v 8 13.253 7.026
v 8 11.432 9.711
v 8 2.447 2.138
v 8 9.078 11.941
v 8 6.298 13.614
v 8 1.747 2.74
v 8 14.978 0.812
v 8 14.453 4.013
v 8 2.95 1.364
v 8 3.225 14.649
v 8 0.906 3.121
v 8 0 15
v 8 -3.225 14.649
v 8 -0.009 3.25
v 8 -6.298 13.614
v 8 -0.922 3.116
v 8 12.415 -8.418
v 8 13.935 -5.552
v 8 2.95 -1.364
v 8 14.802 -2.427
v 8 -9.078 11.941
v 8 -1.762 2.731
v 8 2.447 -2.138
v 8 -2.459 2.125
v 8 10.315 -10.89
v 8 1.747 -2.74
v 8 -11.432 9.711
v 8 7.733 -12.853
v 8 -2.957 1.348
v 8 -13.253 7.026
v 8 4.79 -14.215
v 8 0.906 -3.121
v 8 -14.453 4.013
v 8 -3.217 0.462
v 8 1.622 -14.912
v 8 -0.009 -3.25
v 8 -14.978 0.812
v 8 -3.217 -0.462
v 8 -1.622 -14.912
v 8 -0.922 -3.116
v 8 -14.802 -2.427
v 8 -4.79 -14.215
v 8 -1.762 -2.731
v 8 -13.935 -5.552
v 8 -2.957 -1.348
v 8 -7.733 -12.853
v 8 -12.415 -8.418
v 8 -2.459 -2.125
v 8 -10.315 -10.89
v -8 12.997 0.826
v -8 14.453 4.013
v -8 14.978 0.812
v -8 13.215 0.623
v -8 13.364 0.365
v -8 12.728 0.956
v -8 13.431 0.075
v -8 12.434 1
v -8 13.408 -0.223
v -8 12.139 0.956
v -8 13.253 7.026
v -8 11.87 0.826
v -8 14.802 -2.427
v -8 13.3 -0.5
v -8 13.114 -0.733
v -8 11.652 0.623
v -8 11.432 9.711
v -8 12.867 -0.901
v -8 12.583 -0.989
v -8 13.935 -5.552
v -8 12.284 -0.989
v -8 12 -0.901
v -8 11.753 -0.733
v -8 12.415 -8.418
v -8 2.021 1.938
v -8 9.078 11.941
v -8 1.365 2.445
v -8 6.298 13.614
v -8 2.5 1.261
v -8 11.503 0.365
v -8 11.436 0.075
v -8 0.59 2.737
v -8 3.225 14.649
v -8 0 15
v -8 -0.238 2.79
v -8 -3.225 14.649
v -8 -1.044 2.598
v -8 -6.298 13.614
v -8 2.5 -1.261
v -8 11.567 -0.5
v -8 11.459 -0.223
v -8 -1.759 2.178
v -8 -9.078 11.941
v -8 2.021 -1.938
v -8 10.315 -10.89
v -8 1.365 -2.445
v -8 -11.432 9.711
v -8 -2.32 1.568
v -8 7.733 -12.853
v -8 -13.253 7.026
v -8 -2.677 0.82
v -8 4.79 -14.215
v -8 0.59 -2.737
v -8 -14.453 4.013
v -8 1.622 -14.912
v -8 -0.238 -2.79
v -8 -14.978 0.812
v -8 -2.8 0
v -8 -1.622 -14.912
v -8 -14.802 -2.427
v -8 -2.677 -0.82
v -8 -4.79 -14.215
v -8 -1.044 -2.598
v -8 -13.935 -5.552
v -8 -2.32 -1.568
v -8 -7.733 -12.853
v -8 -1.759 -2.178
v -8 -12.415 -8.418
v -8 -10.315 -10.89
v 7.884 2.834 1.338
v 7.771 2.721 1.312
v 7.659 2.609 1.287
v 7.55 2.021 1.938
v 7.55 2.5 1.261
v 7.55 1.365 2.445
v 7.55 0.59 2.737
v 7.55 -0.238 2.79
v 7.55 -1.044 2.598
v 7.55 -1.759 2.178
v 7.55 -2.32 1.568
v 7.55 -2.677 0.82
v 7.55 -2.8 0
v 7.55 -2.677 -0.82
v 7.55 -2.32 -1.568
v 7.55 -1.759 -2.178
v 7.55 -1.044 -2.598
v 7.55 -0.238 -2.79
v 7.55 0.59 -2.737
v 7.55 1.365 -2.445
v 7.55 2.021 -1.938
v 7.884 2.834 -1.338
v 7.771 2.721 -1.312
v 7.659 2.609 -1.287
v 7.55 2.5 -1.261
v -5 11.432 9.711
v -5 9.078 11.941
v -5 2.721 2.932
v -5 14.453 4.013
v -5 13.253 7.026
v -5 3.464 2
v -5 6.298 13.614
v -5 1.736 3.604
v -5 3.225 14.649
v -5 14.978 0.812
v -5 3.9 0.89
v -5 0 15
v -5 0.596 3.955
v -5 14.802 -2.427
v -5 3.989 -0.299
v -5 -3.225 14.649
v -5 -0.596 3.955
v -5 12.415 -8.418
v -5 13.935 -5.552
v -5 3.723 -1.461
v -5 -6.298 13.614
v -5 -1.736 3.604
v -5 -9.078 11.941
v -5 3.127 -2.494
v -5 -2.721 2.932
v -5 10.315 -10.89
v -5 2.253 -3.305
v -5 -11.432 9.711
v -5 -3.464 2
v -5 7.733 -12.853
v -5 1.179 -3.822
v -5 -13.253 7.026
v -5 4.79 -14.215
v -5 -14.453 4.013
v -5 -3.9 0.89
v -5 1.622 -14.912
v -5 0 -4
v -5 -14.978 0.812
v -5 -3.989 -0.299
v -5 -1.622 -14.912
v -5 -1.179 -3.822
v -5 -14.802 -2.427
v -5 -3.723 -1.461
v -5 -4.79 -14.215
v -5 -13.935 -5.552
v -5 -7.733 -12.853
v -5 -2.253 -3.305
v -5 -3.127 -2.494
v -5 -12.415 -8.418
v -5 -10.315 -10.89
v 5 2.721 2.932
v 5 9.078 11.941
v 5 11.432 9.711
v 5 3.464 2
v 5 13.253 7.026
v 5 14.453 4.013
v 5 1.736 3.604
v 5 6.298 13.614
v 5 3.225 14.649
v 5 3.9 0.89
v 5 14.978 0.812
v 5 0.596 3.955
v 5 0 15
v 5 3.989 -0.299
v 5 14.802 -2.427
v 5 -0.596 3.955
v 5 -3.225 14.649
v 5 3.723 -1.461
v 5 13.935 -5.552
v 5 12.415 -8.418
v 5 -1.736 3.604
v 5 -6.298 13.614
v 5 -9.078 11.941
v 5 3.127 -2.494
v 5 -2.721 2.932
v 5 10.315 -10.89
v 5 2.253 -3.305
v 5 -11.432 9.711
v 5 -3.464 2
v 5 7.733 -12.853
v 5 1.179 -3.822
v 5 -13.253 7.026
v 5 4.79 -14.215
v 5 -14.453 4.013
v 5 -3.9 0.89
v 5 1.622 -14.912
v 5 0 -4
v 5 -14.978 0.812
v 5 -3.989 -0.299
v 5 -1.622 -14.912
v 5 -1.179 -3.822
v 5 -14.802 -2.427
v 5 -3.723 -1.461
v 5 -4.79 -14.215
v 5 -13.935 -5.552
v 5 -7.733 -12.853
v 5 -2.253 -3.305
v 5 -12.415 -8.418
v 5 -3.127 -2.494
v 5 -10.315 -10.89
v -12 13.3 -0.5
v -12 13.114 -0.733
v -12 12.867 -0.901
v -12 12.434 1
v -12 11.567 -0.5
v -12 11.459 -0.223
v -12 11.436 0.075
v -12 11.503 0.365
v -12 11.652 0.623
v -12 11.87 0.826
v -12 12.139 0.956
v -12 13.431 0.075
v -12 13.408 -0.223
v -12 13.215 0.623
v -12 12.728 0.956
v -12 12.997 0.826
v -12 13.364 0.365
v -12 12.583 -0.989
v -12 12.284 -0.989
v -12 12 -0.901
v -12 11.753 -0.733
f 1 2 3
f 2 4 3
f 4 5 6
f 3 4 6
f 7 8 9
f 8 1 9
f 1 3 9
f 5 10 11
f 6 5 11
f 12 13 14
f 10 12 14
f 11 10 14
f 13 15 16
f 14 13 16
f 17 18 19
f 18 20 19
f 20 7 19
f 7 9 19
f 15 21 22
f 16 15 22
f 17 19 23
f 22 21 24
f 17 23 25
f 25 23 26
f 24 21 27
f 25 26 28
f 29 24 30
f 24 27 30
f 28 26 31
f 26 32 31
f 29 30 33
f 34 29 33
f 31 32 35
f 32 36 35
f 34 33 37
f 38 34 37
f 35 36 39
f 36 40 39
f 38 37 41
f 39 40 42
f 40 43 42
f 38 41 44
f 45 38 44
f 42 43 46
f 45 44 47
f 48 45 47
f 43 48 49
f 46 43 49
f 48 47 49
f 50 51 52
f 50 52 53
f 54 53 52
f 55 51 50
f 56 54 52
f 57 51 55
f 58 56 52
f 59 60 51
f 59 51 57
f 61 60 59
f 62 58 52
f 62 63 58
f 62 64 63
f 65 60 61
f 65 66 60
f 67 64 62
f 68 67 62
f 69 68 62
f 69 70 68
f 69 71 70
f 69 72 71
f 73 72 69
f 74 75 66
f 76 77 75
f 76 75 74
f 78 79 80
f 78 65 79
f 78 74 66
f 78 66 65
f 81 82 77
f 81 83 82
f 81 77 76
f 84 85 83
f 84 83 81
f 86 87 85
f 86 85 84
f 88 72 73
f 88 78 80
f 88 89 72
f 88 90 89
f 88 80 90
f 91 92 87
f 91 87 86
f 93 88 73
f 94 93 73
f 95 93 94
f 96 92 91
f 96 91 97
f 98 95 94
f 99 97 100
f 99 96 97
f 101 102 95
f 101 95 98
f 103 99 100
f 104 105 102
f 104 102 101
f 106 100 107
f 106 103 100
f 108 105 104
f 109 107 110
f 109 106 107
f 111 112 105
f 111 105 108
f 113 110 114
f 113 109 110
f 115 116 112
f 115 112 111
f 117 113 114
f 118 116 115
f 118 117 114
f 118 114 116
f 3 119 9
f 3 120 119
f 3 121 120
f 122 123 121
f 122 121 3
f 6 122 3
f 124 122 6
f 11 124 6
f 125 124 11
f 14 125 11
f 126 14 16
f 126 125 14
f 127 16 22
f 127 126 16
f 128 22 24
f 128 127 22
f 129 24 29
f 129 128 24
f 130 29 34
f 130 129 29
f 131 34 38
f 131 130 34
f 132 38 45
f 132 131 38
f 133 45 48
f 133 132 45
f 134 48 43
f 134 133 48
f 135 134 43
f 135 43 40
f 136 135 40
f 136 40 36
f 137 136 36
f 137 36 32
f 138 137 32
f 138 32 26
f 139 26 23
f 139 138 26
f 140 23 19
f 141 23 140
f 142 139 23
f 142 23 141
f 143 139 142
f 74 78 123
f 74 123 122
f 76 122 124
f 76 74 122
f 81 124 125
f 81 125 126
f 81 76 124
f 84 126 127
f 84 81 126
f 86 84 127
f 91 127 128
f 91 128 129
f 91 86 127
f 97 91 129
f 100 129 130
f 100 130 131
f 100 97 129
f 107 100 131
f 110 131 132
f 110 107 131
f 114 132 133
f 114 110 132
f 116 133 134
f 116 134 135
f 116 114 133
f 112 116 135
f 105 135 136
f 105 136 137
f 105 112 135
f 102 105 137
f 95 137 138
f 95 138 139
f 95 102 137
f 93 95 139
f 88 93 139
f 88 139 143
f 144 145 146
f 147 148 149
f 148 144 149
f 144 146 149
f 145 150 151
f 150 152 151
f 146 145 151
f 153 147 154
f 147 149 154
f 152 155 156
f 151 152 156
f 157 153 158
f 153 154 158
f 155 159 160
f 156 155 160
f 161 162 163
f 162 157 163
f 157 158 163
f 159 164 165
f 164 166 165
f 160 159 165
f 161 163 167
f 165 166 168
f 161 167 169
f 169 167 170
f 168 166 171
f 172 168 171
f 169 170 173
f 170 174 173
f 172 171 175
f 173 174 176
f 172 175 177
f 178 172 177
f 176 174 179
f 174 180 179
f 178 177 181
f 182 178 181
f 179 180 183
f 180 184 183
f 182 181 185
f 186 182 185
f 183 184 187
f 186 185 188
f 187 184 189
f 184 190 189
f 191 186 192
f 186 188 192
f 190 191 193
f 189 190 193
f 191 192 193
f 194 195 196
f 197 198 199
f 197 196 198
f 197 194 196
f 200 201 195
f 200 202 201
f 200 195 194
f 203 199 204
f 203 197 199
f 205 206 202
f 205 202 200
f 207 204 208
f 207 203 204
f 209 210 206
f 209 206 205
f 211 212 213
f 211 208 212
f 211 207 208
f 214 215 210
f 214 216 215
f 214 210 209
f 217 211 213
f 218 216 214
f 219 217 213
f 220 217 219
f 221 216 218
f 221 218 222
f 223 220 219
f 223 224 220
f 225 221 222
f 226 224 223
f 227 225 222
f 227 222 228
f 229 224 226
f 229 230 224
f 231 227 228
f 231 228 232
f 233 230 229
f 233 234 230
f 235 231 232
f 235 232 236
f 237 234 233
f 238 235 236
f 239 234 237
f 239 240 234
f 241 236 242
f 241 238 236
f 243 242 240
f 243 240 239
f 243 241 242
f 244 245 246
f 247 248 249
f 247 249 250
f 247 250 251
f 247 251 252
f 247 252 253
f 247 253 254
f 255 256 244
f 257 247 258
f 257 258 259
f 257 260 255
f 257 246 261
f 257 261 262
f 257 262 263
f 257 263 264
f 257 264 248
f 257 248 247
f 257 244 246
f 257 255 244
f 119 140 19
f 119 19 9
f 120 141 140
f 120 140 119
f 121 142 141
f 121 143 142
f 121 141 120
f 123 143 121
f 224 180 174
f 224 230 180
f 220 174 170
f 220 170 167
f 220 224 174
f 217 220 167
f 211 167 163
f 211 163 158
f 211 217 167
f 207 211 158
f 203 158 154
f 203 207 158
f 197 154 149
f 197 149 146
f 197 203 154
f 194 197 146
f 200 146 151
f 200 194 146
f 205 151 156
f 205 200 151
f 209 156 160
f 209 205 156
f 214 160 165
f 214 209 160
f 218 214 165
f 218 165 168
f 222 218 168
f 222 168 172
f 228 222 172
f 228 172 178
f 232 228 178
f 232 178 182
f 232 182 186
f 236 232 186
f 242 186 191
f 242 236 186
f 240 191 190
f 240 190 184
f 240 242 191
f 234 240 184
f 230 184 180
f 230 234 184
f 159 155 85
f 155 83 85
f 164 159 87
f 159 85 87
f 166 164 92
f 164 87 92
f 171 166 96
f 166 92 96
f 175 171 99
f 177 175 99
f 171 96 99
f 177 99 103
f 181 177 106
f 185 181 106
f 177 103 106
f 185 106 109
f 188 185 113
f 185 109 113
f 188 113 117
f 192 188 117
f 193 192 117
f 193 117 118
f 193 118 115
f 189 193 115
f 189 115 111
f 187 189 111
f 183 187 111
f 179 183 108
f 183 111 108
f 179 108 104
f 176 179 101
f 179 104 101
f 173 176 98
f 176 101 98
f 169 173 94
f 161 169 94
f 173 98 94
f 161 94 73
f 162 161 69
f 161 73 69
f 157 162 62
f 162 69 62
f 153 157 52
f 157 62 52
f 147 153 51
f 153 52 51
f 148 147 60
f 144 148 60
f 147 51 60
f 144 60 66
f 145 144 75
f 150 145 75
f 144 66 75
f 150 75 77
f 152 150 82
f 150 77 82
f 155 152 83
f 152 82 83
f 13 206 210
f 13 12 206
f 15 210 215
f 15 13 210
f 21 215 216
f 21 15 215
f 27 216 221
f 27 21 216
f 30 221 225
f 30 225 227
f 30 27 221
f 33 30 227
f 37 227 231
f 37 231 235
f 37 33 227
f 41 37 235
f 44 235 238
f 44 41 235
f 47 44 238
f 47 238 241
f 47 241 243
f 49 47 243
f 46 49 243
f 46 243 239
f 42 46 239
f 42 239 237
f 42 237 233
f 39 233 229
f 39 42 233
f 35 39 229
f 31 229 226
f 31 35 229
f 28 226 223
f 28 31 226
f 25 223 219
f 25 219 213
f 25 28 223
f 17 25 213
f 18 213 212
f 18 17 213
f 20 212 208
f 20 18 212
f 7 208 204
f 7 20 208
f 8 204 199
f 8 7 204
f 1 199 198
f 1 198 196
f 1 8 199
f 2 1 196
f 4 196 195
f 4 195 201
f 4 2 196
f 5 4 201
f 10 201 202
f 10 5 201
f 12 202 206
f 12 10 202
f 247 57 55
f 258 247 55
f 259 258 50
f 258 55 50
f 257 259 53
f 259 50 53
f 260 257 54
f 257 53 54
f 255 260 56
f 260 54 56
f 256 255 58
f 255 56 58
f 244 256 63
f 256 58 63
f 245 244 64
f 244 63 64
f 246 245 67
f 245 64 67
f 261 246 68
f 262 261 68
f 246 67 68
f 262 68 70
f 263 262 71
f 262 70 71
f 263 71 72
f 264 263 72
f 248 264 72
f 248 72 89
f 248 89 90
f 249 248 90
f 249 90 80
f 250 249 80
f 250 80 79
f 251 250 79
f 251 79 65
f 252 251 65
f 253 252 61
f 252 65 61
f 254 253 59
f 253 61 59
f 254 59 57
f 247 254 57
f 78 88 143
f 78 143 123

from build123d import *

# Parameters (mm, degrees)
SKETCH1_R               = 4
FEMALE_SHAFT_DEPTH      = 5
SKETCH6_W               = 3
SKETCH6_H               = 15
MALE_START              = -8
MALE_SHAFT_INSERT_DEPTH = 16
CHAMFER1_SIZE           = 0.45
SKETCH7_R               = 1
BOSS_EXTRUDE1_DEPTH     = 4


# Read off the part's stored shape, not the designer's step: Male Shaft Insert
with BuildPart() as part:
    # Sketch1 → Female Shaft (new, symmetric)
    with BuildSketch(Plane(origin=(0, 0, 0), x_dir=(0, 0, -1), z_dir=(1, 0, 0))):
        Circle(SKETCH1_R)
        with BuildLine():
            Line((-1.260952021, 2.5), (1.260952021, 2.5))
            ThreePointArc((1.260952021, 2.5), (0, -2.8), (-1.260952021, 2.5))
        make_face(mode=Mode.SUBTRACT)
    extrude(amount=FEMALE_SHAFT_DEPTH, both=True)

    # Sketch6 → Spool Edge (revolve)
    with BuildSketch(Plane.XY, mode=Mode.PRIVATE) as spool_edge_sk:
        with Locations((6.5, 7.5)):
            Rectangle(SKETCH6_W, SKETCH6_H)
    spool_edge = revolve(spool_edge_sk.sketch.rotate(Axis((0, 0, 0), (1, 0, 0)), 90), axis=Axis((0, 0, 0), (1, 0, 0)))

    # Spool Edge Mirror: Spool Edge across plane
    add(spool_edge.mirror(Plane(origin=(0, 0, 0), x_dir=(0, 0, 1), z_dir=(1, 0, 0))))

    # Male Shaft Insert outline → Male Shaft Insert (cut)
    with BuildSketch(Plane(origin=(0, 0, 0), x_dir=(0, 0, -1), z_dir=(1, 0, 0)).offset(MALE_START)):
        with BuildLine():
            Line((1.260952021, 2.5), (-1.260952021, 2.5))
            ThreePointArc((-1.260952021, 2.5), (0, -2.8), (1.260952021, 2.5))
        make_face()
    extrude(amount=MALE_SHAFT_INSERT_DEPTH, mode=Mode.SUBTRACT)

    # Chamfer1
    chamfer1_edges = [part.edges().sort_by_distance(p)[0] for p in [
        (8, 2.5, 0),
        (8, -2.8, 0),
    ]]
    chamfer(chamfer1_edges, length=CHAMFER1_SIZE)

    # Sketch7 → Boss-Extrude1 (add)
    with BuildSketch(Plane.ZY.offset(8)):
        with Locations((0, 12.433518361)):
            Circle(SKETCH7_R)
    extrude(amount=BOSS_EXTRUDE1_DEPTH)


solid = part.part
